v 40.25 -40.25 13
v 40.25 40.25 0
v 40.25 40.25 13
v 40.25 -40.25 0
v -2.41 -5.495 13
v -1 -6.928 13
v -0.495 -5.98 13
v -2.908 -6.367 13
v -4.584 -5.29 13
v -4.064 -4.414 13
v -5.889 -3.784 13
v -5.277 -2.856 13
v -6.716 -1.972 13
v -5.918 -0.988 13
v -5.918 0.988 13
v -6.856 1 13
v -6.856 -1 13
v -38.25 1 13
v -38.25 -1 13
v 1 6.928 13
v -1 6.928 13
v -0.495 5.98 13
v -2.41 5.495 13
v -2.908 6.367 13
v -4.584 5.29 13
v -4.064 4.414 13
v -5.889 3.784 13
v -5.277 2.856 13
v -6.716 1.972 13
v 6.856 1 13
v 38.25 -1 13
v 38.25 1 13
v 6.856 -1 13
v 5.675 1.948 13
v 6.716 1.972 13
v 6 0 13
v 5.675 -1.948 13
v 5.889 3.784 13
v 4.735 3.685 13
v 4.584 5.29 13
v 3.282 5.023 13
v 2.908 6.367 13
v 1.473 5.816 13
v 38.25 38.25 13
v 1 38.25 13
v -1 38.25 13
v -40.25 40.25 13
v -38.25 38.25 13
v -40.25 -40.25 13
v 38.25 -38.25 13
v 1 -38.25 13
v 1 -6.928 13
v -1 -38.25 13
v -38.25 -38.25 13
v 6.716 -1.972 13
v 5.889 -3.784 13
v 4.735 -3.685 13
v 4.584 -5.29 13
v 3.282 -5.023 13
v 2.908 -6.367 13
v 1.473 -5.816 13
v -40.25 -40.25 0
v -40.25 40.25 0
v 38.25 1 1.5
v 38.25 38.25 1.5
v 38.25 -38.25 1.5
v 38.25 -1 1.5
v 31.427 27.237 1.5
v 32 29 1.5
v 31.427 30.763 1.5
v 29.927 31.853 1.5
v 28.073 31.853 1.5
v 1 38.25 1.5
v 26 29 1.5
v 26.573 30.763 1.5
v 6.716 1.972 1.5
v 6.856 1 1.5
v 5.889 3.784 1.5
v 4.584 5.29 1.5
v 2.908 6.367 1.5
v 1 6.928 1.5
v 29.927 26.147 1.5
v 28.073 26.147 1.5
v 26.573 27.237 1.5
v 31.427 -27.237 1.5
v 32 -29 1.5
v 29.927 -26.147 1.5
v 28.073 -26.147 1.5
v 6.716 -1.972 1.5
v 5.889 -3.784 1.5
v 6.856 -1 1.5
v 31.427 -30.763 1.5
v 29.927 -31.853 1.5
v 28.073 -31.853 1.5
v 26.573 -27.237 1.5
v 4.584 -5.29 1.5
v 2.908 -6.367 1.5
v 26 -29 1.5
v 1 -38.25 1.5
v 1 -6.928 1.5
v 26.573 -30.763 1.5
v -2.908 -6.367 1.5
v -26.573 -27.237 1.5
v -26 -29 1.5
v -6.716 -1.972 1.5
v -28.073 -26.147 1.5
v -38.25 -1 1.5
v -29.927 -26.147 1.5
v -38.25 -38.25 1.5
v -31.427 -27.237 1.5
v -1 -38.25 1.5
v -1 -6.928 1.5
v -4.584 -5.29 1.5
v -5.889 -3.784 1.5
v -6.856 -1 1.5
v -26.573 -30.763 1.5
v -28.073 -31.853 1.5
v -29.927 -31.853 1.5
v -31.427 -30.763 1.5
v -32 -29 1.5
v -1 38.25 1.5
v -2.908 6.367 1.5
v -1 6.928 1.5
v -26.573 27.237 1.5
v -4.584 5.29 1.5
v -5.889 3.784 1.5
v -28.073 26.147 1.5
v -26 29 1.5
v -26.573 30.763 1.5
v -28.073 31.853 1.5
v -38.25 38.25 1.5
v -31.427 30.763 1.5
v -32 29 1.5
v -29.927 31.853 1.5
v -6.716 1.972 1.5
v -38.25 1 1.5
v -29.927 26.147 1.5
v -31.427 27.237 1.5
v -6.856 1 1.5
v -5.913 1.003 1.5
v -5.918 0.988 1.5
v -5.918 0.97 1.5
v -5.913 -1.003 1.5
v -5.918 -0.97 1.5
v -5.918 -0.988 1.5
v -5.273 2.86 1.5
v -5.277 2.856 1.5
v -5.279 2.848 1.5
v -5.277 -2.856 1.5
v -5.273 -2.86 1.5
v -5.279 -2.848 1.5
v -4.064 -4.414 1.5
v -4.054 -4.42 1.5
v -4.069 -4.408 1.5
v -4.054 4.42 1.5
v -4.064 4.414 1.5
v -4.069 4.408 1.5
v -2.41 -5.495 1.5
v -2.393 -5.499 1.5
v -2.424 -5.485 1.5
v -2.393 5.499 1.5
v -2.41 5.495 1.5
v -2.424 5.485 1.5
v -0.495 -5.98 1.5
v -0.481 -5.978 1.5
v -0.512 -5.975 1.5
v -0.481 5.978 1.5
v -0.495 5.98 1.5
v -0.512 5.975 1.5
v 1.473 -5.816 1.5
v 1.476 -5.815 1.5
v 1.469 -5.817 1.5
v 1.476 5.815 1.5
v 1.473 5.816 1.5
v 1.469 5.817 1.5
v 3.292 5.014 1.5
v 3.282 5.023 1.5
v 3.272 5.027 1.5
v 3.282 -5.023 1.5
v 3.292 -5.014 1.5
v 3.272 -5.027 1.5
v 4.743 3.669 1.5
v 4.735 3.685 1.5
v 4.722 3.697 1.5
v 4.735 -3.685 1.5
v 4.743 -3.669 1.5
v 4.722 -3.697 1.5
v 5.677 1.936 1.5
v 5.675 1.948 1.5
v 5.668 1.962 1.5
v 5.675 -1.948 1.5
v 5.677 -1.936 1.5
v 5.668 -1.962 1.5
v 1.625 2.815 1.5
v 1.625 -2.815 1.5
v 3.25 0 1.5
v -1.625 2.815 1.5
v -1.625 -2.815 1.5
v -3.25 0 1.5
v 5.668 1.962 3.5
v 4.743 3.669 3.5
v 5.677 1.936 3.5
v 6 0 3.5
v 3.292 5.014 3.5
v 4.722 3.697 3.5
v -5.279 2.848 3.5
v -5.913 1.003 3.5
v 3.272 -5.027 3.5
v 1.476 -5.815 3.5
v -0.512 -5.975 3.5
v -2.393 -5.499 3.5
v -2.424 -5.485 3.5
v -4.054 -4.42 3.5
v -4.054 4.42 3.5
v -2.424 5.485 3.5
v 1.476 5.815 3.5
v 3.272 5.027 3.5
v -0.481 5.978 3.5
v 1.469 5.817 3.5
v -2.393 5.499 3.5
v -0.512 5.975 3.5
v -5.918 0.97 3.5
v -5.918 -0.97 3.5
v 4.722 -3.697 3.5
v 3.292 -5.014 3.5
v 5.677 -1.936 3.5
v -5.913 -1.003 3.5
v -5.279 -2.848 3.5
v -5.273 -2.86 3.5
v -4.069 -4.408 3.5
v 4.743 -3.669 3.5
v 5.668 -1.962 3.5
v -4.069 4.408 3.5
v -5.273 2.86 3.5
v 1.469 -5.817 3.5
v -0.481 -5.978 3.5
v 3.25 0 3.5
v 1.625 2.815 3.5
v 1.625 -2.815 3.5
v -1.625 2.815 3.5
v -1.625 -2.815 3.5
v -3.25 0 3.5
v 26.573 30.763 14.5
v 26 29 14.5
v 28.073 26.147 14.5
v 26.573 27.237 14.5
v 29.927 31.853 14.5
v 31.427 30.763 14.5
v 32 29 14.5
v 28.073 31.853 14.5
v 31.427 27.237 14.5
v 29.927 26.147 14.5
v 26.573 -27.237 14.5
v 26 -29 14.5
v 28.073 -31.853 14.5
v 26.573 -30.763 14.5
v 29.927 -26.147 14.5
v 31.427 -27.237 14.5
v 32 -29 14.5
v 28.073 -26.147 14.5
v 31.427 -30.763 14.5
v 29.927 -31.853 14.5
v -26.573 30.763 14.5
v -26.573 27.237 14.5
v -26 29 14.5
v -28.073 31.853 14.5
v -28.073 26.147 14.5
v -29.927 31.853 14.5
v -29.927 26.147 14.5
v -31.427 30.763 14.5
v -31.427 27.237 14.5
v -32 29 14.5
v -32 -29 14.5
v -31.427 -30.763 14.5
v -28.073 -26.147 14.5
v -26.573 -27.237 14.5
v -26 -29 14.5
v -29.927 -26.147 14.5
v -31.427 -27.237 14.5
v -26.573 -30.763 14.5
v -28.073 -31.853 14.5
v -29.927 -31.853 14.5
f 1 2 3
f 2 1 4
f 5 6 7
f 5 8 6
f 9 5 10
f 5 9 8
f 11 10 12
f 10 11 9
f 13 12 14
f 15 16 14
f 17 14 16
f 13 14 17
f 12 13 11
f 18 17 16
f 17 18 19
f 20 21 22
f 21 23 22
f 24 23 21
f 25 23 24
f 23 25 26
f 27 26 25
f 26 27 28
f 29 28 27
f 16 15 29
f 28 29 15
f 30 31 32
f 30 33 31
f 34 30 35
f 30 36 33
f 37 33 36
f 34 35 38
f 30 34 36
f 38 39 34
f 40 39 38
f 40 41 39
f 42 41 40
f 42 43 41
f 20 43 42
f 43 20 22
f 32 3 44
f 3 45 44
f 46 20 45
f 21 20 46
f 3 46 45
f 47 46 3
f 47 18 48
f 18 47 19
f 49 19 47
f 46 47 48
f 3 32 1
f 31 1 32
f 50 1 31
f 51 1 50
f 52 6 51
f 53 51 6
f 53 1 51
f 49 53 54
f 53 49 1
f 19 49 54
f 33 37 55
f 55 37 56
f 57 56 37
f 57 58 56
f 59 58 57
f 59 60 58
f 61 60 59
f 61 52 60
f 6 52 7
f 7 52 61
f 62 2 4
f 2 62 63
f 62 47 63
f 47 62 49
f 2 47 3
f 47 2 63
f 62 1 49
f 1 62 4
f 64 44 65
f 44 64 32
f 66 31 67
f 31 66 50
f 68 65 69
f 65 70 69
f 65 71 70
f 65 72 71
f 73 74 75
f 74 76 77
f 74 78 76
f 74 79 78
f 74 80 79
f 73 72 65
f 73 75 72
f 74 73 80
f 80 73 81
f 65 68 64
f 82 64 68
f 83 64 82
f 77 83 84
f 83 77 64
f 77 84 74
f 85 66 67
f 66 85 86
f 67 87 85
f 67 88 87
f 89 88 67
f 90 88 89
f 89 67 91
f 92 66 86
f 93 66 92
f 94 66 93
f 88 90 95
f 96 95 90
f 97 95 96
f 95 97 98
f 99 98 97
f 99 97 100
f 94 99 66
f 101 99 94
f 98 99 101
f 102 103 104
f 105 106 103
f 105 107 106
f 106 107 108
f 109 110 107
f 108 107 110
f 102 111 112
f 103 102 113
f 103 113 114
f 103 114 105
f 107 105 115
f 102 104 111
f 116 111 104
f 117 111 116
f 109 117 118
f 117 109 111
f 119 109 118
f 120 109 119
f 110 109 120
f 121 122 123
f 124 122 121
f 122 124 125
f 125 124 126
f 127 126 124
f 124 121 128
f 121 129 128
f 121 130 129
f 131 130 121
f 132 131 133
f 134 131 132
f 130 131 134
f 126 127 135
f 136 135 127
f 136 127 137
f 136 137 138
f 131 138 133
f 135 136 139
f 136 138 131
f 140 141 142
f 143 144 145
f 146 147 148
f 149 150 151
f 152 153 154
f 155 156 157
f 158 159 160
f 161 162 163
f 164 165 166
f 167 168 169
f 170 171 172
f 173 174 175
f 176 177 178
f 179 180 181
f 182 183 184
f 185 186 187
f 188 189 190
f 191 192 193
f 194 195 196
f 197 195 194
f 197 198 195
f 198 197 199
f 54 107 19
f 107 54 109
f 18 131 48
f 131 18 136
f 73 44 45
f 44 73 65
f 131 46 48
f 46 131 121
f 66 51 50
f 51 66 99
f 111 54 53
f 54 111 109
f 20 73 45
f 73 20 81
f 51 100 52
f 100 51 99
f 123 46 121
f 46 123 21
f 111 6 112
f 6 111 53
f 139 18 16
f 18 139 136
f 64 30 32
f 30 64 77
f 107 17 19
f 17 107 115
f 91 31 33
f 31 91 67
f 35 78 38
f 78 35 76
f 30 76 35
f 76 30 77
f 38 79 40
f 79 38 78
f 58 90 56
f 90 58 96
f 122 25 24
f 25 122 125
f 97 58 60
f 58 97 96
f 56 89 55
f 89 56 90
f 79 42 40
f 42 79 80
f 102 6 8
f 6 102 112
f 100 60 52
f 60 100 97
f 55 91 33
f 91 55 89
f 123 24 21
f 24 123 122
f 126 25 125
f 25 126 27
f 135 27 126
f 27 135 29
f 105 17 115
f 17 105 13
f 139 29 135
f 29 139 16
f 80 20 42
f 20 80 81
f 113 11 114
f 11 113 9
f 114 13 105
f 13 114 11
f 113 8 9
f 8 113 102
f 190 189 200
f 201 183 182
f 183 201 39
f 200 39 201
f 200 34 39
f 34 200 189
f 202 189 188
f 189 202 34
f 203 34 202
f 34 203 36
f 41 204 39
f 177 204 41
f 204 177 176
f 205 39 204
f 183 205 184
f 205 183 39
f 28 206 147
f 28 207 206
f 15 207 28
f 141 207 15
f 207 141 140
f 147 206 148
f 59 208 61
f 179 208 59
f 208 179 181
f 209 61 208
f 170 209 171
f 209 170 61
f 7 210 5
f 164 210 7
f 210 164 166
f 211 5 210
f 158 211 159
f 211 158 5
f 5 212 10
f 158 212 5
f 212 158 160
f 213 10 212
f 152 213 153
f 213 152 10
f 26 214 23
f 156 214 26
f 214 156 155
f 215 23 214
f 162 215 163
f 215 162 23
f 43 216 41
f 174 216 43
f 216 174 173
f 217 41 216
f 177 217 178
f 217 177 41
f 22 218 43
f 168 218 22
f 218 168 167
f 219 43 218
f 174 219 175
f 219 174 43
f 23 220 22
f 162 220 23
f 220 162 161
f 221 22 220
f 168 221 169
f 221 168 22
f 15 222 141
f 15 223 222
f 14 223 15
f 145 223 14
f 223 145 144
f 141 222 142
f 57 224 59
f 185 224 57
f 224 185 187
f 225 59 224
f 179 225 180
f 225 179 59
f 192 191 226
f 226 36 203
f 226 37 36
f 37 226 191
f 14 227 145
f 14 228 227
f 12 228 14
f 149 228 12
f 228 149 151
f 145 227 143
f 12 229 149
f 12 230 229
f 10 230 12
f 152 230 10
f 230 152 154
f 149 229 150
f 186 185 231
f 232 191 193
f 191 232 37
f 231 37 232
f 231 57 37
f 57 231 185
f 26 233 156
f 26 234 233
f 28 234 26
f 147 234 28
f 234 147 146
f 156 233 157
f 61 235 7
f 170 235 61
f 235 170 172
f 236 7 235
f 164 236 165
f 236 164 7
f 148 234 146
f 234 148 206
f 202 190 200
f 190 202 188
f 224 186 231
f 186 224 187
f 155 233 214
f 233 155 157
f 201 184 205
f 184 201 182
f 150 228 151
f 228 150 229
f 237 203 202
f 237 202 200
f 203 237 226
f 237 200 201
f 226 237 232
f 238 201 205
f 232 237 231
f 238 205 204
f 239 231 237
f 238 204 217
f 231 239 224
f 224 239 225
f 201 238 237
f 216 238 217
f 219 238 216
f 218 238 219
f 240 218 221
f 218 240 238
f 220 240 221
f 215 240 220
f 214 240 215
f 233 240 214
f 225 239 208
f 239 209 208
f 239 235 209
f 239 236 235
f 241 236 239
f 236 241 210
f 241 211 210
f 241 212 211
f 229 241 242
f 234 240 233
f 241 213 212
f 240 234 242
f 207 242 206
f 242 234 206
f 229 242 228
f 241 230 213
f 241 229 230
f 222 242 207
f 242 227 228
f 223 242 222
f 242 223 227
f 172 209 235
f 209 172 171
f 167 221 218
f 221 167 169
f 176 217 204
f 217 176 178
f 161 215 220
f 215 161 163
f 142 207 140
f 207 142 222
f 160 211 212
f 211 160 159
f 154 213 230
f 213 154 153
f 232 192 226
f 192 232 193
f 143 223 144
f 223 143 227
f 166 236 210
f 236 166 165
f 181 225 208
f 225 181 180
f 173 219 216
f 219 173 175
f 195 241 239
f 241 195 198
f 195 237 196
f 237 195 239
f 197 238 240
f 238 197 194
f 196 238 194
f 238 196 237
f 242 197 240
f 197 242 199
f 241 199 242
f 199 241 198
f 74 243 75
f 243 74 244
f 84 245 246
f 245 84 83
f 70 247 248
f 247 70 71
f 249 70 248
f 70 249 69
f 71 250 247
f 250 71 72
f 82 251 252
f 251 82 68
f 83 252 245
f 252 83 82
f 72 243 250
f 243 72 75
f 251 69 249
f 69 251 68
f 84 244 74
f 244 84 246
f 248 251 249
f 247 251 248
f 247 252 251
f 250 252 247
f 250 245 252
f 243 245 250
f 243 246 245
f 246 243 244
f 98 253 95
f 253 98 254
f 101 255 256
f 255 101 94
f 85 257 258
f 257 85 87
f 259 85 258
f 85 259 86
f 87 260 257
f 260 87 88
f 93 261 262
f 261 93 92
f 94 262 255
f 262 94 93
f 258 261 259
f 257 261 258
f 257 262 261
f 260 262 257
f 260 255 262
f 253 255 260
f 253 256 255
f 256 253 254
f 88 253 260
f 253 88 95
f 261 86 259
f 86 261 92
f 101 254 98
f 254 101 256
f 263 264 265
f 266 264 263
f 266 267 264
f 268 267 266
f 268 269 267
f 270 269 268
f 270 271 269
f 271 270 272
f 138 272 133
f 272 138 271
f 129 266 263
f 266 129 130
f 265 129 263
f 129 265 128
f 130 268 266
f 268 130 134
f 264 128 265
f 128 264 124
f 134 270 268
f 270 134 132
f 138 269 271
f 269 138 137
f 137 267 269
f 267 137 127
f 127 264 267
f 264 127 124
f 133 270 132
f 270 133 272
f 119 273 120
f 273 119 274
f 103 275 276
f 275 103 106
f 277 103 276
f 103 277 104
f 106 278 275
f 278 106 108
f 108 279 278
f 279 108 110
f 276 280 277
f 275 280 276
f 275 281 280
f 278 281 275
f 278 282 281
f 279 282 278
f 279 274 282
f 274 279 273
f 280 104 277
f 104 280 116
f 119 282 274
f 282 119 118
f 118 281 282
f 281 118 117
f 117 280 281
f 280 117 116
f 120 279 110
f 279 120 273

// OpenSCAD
lid();

module lid(){
  box_depth = 18;
  pcb_max_h = 5;
  ceiling_depth = 1;
  wall = 2;
  lid_dimensions = 80.5;
  button_height = 3.5;
  finger_d=6;
  button_to_button=58;

  //remove from center
  //translate([-lid_dimensions/2,-lid_dimensions/2,0])
  union()
  {
    //remove from z-center
    translate([0,0,(box_depth-pcb_max_h)/2])
    {
      box(lid_dimensions, box_depth-pcb_max_h, wall, ceiling_depth);
      light_barrier(lid_dimensions, wall, box_depth-pcb_max_h, ceiling_depth);
    }
    
    nut_holder(ceiling_depth, 2.5);
       
    finger(finger_d, box_depth-button_height, button_to_button/2,1,1); 
    finger(finger_d, box_depth-button_height, button_to_button/2,1,-1); 
    finger(finger_d, box_depth-button_height, button_to_button/2,-1,1); 
    finger(finger_d, box_depth-button_height, button_to_button/2,-1,-1); 
  }
  
  module nut_holder(offset, height)
  {
    difference()
    {
      cylinder(d=12,h=height+offset,$fn=100);
      cylinder(d=6.5,h=height+offset+.01,$fn=6);
    }
  }
  
  module finger(d,h,offset,x,y)
  {
     translate([x * offset, y * offset, h / 2])
        cylinder(d = d, h = h, center = true);
  }
  
  module light_barrier(width, wall, height, ceiling_depth)
  {
    difference()
      {
        union() 
        {
          cube([wall, width, height], true);
          cube([width, wall, height], true);
          cylinder(d=14,h=height,center=true);
        }
        translate([0,0,ceiling_depth])
          cylinder(d=12,h=height,center=true);
      }
  }
  
  module box(width, height, wall, floor)
  {
    inner_width = width - 2 * wall;
    difference()
    {
      cube([width ,width, height], true);
      translate([0, 0, floor])
        cube([inner_width, inner_width, height - floor], true);
    }
  }
}
